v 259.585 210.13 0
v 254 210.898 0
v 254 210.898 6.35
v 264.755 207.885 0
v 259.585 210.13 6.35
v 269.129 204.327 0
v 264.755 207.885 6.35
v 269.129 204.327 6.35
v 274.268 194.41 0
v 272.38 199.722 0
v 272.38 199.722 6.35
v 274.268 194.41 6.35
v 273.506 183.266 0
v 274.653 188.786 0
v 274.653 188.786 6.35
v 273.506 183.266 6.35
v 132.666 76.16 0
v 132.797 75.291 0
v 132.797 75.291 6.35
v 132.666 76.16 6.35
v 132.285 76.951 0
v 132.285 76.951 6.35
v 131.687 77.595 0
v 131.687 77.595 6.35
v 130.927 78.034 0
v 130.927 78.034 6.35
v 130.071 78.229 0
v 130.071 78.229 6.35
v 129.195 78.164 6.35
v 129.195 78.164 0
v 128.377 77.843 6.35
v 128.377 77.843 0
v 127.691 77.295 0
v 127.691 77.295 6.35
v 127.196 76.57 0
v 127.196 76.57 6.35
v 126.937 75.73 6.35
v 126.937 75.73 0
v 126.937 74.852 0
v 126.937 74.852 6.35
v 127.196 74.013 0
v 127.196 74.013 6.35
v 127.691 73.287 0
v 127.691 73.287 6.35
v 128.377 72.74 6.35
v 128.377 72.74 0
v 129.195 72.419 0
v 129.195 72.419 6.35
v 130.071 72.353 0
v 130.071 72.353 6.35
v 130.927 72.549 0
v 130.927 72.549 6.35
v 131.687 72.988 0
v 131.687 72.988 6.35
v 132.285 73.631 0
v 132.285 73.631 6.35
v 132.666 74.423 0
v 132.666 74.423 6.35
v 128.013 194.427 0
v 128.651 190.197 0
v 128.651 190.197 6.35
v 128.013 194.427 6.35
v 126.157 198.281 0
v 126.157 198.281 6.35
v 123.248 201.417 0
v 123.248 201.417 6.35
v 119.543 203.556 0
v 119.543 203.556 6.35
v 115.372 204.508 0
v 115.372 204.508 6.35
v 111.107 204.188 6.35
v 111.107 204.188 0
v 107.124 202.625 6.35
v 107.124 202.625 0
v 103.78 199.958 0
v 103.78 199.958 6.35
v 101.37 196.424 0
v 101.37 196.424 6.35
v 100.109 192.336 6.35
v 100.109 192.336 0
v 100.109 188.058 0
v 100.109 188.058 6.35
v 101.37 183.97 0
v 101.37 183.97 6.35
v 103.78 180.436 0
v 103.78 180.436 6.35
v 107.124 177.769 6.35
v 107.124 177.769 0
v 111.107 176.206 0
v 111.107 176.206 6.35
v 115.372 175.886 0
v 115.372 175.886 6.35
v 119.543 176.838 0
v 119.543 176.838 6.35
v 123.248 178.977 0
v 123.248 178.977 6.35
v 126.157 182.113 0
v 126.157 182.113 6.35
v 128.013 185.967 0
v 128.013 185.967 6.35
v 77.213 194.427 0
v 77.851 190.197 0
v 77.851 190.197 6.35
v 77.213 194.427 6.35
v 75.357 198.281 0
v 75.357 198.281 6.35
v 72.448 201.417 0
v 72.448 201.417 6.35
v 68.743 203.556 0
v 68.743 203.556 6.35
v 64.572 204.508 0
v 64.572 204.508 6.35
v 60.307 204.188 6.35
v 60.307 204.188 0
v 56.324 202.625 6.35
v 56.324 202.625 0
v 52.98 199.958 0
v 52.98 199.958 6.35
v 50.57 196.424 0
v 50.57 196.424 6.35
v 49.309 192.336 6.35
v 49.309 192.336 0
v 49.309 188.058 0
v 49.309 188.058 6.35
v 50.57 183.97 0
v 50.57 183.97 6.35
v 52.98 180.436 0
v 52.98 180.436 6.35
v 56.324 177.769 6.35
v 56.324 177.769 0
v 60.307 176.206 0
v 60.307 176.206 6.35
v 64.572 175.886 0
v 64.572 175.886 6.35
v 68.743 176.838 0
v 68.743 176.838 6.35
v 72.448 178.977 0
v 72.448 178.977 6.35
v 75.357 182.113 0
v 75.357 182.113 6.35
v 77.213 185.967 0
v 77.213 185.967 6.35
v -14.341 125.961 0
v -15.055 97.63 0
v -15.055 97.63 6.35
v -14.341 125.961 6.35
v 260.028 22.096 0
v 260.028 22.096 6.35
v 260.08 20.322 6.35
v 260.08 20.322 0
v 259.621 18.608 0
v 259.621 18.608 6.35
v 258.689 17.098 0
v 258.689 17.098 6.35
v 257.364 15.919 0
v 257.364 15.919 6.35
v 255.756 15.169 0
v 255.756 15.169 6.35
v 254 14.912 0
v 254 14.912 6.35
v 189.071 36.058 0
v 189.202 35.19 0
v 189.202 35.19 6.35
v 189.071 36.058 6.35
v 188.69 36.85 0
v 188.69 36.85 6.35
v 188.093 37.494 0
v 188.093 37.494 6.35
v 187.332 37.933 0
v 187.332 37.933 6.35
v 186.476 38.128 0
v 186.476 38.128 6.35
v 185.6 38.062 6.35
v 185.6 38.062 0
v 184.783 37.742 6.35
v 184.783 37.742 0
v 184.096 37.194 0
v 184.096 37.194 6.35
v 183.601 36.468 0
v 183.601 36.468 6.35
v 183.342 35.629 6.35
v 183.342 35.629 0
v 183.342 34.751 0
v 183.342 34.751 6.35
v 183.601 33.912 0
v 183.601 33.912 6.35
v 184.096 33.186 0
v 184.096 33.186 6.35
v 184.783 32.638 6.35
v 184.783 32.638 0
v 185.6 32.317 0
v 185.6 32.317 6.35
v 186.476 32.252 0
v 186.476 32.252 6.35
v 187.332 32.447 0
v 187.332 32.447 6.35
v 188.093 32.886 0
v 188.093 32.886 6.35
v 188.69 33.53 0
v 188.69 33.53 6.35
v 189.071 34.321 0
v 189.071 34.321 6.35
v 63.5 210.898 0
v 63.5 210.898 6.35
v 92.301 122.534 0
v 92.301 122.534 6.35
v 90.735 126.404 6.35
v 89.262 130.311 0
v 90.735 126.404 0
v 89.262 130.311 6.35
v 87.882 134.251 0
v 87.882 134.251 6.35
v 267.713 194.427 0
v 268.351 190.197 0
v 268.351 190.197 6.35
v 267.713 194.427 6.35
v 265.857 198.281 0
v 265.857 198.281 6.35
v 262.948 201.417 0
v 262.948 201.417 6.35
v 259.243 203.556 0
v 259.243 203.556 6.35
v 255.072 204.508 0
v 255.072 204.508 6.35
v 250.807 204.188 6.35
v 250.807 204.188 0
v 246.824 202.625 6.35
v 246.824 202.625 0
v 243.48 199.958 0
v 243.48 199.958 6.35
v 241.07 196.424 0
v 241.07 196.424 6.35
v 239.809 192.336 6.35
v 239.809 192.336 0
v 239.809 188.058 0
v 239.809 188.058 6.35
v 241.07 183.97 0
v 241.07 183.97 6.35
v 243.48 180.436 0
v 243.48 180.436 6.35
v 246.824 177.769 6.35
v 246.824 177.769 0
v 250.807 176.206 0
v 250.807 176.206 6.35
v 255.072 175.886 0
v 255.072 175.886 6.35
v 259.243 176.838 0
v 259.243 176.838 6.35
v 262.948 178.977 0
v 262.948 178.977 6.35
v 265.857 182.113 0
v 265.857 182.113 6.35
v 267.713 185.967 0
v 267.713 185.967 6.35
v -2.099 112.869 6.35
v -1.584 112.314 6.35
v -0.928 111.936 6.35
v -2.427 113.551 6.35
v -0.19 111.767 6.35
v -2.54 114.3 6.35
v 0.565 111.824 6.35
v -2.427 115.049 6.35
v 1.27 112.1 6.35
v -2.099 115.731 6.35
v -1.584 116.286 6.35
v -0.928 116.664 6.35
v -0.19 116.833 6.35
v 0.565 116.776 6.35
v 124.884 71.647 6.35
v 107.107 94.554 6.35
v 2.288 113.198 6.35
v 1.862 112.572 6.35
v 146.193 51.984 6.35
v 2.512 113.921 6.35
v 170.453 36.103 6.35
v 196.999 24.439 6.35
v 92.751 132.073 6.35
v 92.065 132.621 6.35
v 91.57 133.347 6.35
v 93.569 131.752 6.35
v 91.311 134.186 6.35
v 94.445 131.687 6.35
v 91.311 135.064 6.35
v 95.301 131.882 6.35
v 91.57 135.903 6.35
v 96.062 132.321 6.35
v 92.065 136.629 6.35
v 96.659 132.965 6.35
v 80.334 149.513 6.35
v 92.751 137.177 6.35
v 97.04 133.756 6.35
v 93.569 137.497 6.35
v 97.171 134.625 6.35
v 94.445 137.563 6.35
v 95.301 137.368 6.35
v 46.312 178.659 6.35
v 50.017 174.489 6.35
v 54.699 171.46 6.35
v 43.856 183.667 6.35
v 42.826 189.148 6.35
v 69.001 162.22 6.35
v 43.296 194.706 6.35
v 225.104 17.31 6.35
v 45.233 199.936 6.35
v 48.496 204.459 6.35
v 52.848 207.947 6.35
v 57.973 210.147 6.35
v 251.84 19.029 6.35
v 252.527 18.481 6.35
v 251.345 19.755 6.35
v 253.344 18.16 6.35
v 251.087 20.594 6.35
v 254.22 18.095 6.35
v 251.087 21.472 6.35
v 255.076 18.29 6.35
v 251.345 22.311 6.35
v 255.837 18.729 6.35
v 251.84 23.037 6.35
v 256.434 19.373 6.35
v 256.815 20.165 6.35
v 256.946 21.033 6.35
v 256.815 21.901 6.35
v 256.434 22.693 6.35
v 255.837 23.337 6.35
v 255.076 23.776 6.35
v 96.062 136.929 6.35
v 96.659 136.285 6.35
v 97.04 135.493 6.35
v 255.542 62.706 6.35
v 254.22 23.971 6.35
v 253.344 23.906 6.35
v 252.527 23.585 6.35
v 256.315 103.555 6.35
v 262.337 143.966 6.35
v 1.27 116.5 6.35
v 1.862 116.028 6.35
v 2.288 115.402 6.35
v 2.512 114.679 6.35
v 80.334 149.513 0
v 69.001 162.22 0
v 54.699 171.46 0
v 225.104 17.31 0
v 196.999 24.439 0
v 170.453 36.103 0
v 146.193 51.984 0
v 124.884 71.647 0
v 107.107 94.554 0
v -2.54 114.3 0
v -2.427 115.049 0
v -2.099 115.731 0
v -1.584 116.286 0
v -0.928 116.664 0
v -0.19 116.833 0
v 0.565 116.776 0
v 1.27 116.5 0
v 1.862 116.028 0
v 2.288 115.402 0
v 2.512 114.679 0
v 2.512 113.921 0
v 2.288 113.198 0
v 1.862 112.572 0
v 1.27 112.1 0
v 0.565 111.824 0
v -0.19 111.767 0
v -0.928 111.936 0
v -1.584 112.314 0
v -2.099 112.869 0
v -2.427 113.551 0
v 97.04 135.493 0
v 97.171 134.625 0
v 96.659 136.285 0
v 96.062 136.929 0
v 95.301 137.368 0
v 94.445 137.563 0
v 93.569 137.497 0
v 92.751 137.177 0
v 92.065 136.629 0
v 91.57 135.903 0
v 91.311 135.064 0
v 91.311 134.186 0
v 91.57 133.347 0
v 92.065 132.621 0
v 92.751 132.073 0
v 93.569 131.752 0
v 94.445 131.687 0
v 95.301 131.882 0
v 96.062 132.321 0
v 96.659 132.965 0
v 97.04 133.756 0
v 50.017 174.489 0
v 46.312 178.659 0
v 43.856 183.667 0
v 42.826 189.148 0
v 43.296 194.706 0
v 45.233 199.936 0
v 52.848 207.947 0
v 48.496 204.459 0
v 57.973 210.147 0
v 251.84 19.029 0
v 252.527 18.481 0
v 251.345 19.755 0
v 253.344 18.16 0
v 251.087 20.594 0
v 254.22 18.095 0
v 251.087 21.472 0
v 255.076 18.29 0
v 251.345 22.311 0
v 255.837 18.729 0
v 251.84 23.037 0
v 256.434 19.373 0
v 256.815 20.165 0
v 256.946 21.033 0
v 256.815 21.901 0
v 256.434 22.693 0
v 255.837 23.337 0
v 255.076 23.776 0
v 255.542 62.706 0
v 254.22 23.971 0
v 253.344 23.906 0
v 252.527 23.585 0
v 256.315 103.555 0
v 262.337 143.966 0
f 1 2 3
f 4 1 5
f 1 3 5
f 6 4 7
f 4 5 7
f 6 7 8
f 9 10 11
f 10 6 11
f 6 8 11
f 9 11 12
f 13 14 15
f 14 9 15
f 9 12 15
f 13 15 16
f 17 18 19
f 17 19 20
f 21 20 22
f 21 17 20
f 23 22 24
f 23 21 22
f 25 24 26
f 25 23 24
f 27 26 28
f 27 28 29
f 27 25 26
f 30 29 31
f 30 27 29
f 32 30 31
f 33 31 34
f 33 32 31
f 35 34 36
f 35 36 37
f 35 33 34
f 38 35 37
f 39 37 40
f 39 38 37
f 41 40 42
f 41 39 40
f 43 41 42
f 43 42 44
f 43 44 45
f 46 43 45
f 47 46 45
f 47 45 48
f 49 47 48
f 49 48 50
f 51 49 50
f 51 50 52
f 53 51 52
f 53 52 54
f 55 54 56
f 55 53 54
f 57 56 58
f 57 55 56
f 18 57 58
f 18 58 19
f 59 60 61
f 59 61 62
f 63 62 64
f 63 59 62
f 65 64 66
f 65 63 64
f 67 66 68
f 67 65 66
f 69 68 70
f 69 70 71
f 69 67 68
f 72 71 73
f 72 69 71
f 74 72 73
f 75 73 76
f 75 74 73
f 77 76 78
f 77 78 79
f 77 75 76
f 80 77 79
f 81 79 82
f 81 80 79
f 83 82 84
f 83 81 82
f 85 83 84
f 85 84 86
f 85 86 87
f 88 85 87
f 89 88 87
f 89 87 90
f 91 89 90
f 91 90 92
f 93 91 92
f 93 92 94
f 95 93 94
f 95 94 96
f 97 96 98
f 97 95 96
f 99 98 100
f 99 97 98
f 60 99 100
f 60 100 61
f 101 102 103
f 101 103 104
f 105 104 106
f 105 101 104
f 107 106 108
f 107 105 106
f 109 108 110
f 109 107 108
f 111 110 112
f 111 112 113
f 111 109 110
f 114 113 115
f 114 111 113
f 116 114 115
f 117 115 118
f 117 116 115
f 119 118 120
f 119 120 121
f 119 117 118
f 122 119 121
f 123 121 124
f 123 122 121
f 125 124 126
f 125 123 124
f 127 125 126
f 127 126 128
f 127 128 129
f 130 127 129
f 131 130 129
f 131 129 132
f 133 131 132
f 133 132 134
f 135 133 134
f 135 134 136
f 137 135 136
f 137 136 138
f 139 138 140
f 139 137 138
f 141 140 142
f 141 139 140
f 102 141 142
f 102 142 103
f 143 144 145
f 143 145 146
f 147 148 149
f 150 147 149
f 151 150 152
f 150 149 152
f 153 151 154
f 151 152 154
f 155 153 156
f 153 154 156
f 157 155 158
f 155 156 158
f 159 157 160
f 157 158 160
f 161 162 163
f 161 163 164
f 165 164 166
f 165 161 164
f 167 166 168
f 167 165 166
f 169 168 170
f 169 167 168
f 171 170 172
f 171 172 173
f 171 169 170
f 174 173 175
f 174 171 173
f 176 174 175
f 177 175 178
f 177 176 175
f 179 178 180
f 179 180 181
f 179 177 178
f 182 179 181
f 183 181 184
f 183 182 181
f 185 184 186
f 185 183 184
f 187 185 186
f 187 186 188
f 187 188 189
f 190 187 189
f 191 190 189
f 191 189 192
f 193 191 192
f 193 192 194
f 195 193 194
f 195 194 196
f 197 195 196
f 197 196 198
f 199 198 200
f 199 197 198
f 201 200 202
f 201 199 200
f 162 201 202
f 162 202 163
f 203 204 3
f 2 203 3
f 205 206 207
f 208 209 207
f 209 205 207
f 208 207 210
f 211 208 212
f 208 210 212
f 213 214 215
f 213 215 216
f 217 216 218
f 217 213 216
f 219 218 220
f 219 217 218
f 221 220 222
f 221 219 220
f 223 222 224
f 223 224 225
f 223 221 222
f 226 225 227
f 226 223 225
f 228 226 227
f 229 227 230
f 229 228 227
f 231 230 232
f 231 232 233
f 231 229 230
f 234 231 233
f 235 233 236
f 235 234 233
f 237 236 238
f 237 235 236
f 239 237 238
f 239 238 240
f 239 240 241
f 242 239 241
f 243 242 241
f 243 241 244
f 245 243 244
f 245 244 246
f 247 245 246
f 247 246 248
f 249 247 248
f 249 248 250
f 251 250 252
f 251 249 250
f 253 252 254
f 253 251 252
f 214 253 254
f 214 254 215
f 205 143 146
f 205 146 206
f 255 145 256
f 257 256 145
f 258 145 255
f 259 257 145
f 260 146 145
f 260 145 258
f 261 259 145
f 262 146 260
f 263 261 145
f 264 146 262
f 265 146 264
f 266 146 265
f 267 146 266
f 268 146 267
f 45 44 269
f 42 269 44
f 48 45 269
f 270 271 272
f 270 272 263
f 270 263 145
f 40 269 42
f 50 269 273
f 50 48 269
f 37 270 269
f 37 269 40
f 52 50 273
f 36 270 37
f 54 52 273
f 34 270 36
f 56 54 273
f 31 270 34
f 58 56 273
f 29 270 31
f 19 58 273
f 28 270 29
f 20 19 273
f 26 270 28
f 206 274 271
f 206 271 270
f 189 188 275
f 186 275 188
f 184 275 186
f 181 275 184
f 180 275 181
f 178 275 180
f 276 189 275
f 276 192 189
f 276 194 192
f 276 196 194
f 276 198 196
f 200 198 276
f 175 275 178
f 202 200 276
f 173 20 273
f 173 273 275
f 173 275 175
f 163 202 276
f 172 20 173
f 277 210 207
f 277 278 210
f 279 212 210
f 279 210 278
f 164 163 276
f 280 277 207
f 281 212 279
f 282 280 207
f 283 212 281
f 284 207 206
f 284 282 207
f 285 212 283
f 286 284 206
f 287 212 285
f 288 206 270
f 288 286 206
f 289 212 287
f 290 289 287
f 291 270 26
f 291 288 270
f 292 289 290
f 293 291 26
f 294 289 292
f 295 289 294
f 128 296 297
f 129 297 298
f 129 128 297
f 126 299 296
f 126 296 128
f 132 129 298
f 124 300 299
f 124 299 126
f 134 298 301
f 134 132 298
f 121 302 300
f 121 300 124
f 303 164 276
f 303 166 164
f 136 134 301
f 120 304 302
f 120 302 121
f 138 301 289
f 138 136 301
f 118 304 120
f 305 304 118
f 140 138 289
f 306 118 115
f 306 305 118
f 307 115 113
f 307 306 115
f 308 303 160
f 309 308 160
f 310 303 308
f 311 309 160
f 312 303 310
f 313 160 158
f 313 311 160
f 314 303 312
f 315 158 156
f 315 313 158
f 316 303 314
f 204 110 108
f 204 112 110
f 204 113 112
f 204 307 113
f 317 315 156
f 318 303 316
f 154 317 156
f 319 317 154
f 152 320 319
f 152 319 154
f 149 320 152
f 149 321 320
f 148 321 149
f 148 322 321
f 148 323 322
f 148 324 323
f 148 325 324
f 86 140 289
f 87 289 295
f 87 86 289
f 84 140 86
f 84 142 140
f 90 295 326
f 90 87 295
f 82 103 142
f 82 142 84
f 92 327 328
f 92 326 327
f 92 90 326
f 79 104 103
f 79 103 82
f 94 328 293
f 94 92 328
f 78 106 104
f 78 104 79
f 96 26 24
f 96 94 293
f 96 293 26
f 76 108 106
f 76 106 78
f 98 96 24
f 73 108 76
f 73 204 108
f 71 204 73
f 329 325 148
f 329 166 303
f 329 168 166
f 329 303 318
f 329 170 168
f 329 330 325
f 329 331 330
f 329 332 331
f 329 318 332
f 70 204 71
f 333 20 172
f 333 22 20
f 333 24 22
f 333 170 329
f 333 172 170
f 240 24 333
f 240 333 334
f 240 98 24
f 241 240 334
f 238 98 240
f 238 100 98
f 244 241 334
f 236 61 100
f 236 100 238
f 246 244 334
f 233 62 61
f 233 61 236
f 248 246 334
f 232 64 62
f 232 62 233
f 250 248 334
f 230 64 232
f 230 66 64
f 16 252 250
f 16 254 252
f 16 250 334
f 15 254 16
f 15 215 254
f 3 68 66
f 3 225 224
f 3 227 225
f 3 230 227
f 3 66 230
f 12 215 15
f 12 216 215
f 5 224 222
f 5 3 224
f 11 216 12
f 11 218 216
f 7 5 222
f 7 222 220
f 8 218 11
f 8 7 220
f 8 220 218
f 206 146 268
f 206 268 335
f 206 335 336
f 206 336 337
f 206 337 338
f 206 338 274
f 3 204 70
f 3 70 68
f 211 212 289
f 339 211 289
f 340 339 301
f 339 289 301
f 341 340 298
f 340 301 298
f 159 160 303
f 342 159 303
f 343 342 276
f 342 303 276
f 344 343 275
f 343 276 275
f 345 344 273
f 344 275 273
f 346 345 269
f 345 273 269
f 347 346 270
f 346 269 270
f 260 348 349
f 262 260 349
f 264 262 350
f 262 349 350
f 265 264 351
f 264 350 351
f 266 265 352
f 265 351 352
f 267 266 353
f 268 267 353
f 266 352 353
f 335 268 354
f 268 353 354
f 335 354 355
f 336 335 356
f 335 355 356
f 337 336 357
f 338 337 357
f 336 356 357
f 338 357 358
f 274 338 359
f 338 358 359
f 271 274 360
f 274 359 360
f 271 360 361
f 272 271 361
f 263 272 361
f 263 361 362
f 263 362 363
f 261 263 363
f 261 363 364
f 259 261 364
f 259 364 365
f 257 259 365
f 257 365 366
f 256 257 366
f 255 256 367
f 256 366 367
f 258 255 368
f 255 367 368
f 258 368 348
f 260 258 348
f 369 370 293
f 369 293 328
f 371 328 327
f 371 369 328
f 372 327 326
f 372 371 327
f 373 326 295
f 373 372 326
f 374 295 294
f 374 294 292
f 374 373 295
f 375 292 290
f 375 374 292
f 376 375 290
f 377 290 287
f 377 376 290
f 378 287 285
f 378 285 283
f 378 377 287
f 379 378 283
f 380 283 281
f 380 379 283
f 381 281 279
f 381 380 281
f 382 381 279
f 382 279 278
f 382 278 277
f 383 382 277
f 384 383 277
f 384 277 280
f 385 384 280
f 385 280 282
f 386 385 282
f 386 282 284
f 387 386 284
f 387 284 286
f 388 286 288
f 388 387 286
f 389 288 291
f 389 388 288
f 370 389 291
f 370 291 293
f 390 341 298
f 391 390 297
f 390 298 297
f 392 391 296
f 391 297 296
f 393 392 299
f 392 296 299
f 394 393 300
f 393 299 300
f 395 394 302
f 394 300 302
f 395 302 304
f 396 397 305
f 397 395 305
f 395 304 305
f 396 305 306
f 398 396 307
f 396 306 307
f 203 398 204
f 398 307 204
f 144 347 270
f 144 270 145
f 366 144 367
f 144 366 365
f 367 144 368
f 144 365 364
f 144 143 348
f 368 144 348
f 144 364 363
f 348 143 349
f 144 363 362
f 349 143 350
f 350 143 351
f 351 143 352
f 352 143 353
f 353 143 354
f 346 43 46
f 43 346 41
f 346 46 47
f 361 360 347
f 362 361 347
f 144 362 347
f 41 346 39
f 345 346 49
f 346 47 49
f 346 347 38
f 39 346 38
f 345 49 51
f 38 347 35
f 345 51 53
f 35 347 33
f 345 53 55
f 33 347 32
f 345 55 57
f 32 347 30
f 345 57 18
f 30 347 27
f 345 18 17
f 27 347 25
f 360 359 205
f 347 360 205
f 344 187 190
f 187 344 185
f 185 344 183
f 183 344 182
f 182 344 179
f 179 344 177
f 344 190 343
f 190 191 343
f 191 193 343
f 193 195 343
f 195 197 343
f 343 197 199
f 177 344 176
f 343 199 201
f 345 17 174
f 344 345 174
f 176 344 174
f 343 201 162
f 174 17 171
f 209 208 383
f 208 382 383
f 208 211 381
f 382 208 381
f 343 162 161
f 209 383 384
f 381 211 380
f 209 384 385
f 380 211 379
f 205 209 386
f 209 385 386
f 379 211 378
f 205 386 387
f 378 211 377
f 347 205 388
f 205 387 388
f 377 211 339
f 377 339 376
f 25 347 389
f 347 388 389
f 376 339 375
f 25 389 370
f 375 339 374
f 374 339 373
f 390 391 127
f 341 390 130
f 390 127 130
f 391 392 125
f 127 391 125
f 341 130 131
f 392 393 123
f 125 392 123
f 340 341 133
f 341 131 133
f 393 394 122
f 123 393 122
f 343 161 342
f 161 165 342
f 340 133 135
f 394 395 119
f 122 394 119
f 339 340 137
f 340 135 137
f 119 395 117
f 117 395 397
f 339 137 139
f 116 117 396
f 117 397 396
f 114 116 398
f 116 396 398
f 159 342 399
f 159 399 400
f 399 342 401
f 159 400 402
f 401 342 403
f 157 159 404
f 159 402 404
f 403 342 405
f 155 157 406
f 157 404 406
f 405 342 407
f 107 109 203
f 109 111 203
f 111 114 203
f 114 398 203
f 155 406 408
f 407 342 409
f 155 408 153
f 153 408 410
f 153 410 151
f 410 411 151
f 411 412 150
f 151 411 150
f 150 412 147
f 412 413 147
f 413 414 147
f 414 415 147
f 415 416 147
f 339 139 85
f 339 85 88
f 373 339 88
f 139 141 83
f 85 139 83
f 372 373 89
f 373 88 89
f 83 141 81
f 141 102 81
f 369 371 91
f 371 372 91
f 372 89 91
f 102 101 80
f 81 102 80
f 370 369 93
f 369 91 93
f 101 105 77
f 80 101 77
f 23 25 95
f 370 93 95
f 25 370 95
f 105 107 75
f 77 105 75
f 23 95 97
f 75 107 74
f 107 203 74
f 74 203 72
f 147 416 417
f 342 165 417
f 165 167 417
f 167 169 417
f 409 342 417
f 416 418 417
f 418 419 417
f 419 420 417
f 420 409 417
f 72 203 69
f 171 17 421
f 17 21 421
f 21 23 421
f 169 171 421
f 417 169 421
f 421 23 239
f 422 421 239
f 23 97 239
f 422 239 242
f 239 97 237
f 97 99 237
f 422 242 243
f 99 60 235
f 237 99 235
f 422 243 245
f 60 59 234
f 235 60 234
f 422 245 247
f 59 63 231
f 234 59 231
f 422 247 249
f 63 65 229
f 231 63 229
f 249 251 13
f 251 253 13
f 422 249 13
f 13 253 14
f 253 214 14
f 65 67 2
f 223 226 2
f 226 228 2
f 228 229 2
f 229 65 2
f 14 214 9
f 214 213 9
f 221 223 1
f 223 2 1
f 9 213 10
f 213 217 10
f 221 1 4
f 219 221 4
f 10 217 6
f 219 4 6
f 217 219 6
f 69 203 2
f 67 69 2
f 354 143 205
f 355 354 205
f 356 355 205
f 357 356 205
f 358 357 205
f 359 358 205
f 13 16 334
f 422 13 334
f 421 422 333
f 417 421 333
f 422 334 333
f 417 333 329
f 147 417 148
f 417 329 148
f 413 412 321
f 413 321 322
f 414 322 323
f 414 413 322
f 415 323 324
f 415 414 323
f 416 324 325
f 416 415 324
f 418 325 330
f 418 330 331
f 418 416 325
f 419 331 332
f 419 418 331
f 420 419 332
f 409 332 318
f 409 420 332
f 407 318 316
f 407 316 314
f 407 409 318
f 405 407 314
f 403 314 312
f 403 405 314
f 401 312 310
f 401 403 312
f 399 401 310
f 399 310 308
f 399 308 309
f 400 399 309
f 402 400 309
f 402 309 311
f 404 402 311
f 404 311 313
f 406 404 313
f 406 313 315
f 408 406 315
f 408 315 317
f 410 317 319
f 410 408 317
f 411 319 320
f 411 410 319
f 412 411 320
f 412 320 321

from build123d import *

# Parameters (mm, degrees)
SKETCH1_W           = 342.9
SKETCH1_H           = 225.424999902
SKETCH1_R           = 14.351
SKETCH1_R_2         = 2.9464
BOSS_EXTRUDE1_DEPTH = 6.35
SKETCH3_W           = 82.55
SKETCH3_H           = 25.4
SKETCH3_W_2         = 107.95
BOSS_EXTRUDE2_DEPTH = 6.35
SKETCH2_W           = 349.25
SKETCH2_H           = 250.824999902
CUT_EXTRUDE1_DEPTH  = 425.892825399
SKETCH4_R           = 2.54
BOSS_EXTRUDE3_DEPTH = 6.35


with BuildPart() as part:
    # Sketch1 → Boss-Extrude1 (new body)
    with BuildSketch(Plane.XY):
        with Locations((171.45, 112.712499951)):
            Rectangle(SKETCH1_W, SKETCH1_H)
        with Locations((254, 190.196999902)):
            Circle(SKETCH1_R, mode=Mode.SUBTRACT)
        with Locations((254, 21.032999902)):
            Circle(SKETCH1_R_2, mode=Mode.SUBTRACT)
        with Locations((186.255842738, 35.189941827)):
            Circle(SKETCH1_R_2, mode=Mode.SUBTRACT)
        with Locations((129.850387567, 75.291244482)):
            Circle(SKETCH1_R_2, mode=Mode.SUBTRACT)
        with Locations((63.5, 190.196999902)):
            Circle(SKETCH1_R, mode=Mode.SUBTRACT)
        with Locations((94.224517333, 134.624938265)):
            Circle(SKETCH1_R_2, mode=Mode.SUBTRACT)
        with Locations((114.3, 190.196999902)):
            Circle(SKETCH1_R, mode=Mode.SUBTRACT)
    extrude(amount=BOSS_EXTRUDE1_DEPTH)

    # Sketch3 → Boss-Extrude2 (add)
    with BuildSketch(Plane.XY.offset(6.35)):
        with Locations((41.275, 238.124999902)):
            Rectangle(SKETCH3_W, SKETCH3_H)
        with Locations((288.925, 238.124999902)):
            Rectangle(SKETCH3_W_2, SKETCH3_H)
    extrude(amount=-BOSS_EXTRUDE2_DEPTH)

    # Sketch2 → Cut-Extrude1 (cut, through all)
    with BuildSketch(Plane.XY.offset(6.35)):
        with Locations((174.625, 125.412499951)):
            Rectangle(SKETCH2_W, SKETCH2_H)
        with BuildLine():
            Line((63.5, 210.897999902), (254, 210.897999902))
            ThreePointArc((254, 210.897999902), (270.911602996, 202.135554467), (273.506313236, 183.266260769))
            ThreePointArc((273.506313236, 183.266260769), (256.315295195, 103.55517199), (260.028402179, 22.095969857))
            ThreePointArc((260.028402179, 22.095969857), (258.689264454, 17.098239828), (254, 14.911599902))
            ThreePointArc((254, 14.911599902), (151.729543137, 47.839263526), (87.882448428, 134.251217999))
            ThreePointArc((87.882448428, 134.251217999), (75.095322901, 156.248343931), (54.699389386, 171.459853539))
            ThreePointArc((54.699389386, 171.459853539), (43.295927788, 194.705532598), (63.5, 210.897999902))
        make_face(mode=Mode.SUBTRACT)
    extrude(amount=-CUT_EXTRUDE1_DEPTH, mode=Mode.SUBTRACT)

    # Sketch4 → Boss-Extrude3 (add, through all)
    with BuildSketch(Plane(origin=(0, 0, 0), x_dir=(-1, 0, 0), z_dir=(0, 0, -1))):
        with BuildLine():
            Line((14.341332207, 125.960529154), (-92.300756311, 122.533671254))
            ThreePointArc((-92.300756311, 122.533671254), (-99.071136292, 108.209082235), (-107.107329861, 94.554358196))
            Line((-107.107329861, 94.554358196), (15.054572396, 97.629850266))
            Line((15.054572396, 97.629850266), (14.341332207, 125.960529154))
        make_face()
        with Locations((0, 114.3)):
            Circle(SKETCH4_R, mode=Mode.SUBTRACT)
    extrude(amount=-BOSS_EXTRUDE3_DEPTH)


solid = part.part
